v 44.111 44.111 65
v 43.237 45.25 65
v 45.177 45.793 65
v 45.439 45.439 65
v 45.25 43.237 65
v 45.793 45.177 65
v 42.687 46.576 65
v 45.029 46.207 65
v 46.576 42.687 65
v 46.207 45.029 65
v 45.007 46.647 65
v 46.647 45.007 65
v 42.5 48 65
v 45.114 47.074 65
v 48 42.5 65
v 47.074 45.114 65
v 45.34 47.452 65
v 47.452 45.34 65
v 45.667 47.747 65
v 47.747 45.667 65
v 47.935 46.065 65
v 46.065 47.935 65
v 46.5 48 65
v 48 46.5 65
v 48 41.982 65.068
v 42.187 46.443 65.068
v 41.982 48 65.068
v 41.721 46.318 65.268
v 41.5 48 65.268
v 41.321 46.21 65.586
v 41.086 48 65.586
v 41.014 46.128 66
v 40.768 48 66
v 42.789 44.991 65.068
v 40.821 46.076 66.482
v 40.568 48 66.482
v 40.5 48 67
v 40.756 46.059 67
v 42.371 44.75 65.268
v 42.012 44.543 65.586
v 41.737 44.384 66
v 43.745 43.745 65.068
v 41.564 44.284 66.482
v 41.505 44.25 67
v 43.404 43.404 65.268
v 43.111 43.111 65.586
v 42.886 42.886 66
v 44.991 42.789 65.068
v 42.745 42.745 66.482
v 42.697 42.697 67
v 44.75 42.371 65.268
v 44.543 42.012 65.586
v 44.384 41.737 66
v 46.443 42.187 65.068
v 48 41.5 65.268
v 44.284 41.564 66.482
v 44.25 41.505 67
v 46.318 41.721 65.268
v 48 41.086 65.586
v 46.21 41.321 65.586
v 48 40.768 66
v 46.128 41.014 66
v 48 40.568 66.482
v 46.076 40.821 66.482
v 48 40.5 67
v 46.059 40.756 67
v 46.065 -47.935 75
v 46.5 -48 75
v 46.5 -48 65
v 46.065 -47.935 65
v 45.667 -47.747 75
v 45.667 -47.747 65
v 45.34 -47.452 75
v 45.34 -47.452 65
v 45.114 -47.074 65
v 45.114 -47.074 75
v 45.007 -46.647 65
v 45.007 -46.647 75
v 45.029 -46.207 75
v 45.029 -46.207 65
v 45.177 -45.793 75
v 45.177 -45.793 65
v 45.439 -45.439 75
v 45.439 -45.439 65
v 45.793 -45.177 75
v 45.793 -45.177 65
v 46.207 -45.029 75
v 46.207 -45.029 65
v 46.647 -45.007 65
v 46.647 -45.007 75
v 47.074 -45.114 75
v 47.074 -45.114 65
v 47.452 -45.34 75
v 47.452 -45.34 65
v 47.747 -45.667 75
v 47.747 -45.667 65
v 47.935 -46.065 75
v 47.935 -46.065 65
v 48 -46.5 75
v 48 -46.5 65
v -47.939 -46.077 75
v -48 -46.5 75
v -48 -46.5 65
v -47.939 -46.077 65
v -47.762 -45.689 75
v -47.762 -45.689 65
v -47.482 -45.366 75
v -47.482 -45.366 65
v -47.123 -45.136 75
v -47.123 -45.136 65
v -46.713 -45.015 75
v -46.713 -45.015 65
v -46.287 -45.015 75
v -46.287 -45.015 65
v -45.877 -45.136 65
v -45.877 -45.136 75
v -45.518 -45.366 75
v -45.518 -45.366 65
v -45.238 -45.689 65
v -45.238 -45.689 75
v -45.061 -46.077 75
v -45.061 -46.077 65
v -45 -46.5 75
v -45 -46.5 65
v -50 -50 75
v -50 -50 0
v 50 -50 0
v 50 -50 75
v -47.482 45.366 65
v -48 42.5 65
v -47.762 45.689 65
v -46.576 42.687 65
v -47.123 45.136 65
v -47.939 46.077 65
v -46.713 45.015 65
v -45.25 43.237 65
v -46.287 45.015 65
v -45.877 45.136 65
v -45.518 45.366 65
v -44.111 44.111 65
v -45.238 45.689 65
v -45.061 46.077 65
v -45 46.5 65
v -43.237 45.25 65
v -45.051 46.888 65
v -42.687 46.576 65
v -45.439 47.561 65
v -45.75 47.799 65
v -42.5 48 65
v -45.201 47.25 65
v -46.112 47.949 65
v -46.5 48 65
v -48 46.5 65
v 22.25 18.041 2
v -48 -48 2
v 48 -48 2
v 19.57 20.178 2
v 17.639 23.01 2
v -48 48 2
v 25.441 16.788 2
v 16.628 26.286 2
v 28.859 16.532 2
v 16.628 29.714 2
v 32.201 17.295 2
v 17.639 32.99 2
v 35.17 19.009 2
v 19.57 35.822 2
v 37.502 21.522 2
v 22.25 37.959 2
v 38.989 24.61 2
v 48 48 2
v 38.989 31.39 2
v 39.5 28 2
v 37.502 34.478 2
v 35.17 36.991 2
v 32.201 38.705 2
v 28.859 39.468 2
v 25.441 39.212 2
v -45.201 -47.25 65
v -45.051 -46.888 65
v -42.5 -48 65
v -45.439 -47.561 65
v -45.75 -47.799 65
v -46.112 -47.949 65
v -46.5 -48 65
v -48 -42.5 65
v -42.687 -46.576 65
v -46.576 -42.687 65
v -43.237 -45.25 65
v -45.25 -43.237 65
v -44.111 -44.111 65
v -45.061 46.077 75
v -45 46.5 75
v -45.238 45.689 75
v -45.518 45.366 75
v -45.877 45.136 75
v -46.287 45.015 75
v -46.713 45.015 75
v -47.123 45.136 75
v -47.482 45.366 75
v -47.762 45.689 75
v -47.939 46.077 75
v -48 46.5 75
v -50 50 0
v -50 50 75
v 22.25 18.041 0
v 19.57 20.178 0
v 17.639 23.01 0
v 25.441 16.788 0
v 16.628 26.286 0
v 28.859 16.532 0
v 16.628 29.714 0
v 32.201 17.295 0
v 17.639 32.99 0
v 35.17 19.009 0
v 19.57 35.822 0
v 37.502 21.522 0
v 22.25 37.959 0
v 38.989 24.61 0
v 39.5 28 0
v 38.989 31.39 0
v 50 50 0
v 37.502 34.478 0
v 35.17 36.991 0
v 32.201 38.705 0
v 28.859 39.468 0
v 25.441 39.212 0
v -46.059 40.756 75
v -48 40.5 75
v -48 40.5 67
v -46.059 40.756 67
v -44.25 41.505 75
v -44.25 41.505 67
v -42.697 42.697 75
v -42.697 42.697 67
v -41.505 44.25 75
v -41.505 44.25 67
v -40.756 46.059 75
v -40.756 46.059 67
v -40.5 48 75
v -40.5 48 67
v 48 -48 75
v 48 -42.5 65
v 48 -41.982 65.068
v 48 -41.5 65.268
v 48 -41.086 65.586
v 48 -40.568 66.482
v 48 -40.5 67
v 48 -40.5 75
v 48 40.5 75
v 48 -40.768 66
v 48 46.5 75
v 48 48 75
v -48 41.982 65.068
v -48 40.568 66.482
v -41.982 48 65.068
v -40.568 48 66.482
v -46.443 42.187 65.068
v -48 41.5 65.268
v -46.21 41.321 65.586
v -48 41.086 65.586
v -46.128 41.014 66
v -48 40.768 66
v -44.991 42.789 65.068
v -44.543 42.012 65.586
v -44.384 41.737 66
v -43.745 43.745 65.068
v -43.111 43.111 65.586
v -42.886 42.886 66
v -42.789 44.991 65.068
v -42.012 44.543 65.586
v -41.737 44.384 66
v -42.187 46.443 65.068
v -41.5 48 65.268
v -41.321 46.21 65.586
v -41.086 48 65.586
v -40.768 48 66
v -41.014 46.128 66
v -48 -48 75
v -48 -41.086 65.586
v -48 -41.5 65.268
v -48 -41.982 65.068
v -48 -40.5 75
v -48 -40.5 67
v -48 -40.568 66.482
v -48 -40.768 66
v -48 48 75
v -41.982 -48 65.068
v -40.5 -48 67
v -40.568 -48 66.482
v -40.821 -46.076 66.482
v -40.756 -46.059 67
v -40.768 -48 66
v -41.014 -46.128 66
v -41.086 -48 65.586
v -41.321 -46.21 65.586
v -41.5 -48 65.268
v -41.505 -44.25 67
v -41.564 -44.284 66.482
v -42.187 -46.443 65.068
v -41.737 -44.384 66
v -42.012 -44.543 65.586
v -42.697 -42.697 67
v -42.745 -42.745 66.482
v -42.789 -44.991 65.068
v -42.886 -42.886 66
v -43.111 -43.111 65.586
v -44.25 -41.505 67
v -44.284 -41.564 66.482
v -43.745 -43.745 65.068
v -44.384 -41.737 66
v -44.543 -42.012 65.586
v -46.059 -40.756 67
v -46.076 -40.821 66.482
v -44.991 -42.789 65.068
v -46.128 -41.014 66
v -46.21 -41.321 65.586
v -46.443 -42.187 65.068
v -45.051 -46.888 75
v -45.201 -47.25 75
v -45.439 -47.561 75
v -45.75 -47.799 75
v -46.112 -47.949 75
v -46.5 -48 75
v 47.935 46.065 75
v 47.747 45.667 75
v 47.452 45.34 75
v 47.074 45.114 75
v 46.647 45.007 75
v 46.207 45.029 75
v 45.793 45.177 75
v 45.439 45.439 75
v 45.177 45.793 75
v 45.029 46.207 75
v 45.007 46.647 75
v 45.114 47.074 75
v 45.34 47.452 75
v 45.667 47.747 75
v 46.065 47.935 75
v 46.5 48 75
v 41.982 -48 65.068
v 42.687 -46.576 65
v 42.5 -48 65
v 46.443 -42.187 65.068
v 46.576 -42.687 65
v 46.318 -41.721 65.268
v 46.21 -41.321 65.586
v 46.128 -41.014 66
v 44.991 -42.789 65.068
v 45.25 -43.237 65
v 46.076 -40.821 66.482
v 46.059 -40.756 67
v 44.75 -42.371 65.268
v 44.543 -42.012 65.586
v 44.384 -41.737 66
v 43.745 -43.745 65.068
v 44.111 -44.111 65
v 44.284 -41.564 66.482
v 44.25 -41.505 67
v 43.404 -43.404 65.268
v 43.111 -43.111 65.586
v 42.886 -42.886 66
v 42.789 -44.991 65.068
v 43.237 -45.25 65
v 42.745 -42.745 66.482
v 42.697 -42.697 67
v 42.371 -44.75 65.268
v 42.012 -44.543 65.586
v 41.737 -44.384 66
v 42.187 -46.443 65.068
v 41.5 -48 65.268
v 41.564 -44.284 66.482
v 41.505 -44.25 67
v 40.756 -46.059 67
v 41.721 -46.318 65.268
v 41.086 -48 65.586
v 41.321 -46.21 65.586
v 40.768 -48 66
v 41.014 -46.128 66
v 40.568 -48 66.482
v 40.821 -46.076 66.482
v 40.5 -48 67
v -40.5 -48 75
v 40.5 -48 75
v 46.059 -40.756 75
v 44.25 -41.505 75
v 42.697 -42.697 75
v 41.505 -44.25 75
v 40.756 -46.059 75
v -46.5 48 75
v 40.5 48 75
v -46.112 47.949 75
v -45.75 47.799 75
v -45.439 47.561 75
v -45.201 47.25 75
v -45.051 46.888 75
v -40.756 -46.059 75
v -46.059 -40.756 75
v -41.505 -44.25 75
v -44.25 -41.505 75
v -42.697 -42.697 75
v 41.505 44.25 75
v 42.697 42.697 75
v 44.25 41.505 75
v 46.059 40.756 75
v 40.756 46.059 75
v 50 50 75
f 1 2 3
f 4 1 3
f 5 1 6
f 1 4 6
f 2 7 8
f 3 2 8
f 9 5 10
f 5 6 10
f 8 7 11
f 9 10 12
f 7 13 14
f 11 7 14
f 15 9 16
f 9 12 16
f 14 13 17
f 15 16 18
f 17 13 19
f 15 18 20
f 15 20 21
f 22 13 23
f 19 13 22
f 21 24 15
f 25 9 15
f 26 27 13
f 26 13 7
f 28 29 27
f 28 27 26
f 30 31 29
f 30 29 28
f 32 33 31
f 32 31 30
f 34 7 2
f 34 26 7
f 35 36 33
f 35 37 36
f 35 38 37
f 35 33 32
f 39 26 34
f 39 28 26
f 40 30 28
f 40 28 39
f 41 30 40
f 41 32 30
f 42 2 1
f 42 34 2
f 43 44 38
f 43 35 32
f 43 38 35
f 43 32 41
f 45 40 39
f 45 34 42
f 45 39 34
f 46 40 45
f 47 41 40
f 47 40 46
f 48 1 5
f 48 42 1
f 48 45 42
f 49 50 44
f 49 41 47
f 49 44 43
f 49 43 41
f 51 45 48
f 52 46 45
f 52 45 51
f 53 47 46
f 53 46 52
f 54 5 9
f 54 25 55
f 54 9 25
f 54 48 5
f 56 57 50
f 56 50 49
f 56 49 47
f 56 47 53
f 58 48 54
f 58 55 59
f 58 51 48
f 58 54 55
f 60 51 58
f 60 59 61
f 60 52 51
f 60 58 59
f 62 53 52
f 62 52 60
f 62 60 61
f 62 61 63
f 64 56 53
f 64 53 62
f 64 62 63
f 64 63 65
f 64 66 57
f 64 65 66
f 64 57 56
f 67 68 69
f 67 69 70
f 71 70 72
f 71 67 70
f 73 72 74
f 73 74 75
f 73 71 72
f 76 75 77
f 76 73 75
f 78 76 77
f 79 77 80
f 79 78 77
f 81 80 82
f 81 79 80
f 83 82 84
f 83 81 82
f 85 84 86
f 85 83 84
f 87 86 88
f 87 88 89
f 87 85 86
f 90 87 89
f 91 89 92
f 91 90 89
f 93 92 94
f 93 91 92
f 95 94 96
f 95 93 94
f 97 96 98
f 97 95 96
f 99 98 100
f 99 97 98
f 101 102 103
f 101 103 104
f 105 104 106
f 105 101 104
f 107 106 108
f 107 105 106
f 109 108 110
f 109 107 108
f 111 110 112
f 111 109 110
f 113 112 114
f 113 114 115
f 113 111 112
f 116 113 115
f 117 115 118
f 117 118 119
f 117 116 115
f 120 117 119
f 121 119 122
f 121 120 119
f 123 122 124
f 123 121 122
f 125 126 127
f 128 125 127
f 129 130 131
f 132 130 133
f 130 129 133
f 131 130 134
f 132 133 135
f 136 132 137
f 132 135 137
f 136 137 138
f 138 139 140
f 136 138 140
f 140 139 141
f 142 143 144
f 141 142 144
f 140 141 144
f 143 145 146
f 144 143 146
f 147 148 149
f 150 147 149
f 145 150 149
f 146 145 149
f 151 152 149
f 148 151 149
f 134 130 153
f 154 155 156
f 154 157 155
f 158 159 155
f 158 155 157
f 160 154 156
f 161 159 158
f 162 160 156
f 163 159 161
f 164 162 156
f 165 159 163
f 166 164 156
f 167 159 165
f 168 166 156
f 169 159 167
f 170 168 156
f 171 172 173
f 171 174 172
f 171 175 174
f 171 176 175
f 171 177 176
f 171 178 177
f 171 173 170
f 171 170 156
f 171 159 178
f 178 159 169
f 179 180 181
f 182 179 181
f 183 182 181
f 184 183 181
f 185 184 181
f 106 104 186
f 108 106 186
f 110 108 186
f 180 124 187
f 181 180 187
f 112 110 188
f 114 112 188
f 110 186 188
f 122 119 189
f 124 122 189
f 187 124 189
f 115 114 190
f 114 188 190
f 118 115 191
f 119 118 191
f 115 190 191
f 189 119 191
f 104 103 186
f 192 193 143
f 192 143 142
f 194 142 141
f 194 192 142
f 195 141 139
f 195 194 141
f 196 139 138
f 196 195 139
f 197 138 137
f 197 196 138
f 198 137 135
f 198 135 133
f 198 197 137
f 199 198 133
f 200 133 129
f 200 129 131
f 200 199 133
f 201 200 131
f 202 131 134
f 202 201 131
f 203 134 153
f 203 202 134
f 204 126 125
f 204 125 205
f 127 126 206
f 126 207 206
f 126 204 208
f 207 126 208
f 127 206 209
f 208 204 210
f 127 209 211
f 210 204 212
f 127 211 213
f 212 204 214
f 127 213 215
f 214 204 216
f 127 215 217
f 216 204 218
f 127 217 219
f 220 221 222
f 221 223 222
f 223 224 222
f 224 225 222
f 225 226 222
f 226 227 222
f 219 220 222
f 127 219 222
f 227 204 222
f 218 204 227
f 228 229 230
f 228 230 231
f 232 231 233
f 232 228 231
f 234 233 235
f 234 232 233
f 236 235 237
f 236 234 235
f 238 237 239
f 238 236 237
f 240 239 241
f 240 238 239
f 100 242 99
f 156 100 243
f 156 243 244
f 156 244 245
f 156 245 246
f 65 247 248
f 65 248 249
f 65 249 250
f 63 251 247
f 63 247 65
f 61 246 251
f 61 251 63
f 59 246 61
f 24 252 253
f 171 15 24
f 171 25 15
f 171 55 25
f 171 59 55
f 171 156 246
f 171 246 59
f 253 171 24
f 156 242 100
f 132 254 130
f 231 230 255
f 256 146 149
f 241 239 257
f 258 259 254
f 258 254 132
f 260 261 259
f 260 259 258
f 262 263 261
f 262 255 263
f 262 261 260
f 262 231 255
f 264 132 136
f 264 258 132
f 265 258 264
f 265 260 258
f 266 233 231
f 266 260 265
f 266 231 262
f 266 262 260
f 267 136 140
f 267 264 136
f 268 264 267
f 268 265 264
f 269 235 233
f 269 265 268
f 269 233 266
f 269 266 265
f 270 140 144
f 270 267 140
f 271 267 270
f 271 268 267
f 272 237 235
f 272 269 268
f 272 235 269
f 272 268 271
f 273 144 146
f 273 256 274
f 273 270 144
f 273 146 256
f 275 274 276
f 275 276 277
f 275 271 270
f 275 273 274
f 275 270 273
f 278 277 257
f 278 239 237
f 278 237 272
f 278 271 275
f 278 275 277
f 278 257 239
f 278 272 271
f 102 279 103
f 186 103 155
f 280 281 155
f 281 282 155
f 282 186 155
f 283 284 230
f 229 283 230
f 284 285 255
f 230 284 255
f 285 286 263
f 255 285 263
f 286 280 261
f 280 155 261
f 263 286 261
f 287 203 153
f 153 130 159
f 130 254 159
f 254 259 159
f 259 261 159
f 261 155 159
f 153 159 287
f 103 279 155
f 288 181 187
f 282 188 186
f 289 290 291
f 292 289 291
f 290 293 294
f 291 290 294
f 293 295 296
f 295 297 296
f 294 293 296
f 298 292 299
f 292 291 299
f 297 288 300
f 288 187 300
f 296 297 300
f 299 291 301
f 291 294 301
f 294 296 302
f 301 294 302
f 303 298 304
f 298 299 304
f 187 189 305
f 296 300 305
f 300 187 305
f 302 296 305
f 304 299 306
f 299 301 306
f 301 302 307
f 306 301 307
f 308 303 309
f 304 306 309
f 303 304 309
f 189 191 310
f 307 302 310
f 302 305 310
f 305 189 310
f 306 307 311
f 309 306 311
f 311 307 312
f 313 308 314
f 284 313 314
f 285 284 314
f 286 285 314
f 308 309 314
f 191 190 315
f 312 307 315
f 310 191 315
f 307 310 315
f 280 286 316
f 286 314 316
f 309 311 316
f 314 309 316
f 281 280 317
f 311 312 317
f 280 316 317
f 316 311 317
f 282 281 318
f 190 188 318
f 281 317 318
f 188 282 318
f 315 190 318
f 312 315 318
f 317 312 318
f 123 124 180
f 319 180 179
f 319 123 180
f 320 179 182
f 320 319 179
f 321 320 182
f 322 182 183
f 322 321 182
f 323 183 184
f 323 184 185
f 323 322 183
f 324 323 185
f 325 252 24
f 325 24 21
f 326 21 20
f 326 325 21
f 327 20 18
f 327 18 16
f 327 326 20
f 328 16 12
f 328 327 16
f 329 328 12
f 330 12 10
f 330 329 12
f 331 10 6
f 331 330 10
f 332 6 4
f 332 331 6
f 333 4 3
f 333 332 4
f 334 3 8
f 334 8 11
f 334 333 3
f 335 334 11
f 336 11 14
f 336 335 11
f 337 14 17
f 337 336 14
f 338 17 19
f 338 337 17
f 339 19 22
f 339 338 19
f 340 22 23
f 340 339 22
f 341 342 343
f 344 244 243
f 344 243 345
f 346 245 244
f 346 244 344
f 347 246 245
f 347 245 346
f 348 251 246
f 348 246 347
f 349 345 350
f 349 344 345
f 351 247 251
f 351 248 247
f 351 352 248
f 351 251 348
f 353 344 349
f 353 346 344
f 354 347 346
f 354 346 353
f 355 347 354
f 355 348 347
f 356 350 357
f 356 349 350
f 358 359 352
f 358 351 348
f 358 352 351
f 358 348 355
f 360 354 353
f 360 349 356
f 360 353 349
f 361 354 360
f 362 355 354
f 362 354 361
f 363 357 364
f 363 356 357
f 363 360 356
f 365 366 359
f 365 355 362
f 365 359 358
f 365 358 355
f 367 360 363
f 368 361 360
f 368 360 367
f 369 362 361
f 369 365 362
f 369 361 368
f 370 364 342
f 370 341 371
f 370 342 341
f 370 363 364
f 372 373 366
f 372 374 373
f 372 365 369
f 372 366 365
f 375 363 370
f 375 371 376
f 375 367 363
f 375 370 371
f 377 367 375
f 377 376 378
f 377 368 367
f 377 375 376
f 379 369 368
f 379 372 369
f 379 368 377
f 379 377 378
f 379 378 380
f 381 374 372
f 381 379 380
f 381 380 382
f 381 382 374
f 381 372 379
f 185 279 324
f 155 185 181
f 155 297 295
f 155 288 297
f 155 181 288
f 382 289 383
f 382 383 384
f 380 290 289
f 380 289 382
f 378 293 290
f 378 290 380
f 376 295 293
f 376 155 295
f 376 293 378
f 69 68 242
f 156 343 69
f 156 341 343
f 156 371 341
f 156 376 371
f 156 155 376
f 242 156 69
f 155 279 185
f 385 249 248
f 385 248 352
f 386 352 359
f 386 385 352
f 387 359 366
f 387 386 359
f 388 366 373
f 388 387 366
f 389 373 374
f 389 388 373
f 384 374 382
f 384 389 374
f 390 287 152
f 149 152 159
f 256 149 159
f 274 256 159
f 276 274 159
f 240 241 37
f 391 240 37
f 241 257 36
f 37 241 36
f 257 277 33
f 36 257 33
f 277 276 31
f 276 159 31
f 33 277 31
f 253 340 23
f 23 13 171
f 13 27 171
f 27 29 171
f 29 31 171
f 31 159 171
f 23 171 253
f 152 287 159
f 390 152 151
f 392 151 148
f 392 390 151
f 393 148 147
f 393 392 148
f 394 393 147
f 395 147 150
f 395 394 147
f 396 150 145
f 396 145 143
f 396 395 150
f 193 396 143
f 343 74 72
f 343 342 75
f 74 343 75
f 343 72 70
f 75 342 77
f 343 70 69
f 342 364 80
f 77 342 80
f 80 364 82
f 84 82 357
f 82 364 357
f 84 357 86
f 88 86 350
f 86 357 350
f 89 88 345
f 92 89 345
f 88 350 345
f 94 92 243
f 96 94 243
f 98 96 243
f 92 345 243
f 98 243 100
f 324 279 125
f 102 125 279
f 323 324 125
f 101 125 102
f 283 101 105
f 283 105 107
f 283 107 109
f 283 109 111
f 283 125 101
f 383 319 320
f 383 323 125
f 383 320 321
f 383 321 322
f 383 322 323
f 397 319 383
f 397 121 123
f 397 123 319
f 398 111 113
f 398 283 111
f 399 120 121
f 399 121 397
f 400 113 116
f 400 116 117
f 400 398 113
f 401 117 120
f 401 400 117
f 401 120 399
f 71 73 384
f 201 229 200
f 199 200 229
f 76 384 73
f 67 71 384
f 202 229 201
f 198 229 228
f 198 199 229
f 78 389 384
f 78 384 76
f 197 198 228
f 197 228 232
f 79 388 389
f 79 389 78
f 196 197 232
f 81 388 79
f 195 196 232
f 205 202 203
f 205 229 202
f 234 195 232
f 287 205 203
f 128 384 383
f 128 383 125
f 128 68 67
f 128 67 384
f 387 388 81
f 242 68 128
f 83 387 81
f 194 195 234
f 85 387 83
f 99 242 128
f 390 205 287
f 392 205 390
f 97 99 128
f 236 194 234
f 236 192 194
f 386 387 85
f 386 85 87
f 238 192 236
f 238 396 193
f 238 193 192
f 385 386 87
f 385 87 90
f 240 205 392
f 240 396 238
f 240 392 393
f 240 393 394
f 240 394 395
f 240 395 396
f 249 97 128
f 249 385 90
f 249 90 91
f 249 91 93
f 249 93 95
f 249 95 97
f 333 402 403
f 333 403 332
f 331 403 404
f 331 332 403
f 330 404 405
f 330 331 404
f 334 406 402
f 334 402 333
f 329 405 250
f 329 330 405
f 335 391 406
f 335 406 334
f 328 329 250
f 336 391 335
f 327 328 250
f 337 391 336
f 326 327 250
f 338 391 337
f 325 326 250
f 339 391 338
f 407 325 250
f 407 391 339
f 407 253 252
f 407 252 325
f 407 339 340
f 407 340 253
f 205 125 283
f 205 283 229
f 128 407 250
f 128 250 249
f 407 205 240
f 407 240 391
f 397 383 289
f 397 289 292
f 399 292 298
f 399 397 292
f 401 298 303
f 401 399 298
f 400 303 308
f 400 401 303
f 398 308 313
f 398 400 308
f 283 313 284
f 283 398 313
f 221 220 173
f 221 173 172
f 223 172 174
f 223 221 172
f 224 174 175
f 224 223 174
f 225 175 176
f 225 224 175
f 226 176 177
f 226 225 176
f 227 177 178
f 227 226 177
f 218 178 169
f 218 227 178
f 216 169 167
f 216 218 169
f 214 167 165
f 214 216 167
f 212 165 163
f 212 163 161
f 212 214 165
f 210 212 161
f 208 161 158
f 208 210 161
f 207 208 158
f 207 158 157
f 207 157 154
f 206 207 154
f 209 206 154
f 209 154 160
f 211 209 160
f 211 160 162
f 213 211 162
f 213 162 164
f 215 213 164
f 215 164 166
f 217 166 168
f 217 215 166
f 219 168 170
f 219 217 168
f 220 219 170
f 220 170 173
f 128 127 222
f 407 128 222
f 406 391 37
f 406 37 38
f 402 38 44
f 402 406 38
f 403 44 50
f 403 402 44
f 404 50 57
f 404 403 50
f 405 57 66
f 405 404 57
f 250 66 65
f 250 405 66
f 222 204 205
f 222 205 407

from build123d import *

# Parameters (mm, degrees)
F0_W     = 100
F0_H     = 100
F0_W_2   = 96
F0_H_2   = 96
F1_DEPTH = 75
F0_R     = 11.5
F2_DEPTH = 2
F4_DEPTH = 10
F5_R     = 2
F6_DEPTH = 10


with BuildPart() as f1:
    # F0 (on Top) → F1 (new body)
    with BuildSketch(Plane.XY):
        Rectangle(F0_W, F0_H)
        Rectangle(F0_W_2, F0_H_2, mode=Mode.SUBTRACT)
    extrude(amount=F1_DEPTH)

    # F0 (on Top) → F2 (join)
    with BuildSketch(Plane.XY):
        Rectangle(F0_W_2, F0_H_2)
        with Locations((28, 28)):
            Circle(F0_R, mode=Mode.SUBTRACT)
    extrude(amount=F2_DEPTH)

    # F3 (on face) → F4 (join)
    with BuildSketch(Plane.XY.offset(75)):
        with BuildLine():
            Line((46.5, 48), (40.5, 48))
            ThreePointArc((40.5, 48), (42.696699, 42.696699), (48, 40.5))
            Line((48, 40.5), (48, 46.5))
            ThreePointArc((48, 46.5), (45.43934, 45.43934), (46.5, 48))
        make_face()
        with BuildLine():
            Line((48, -46.5), (48, -40.5))
            ThreePointArc((48, -40.5), (42.696699, -42.696699), (40.5, -48))
            Line((40.5, -48), (46.5, -48))
            ThreePointArc((46.5, -48), (45.43934, -45.43934), (48, -46.5))
        make_face()
        with BuildLine():
            ThreePointArc((-40.5, -48), (-42.696699, -42.696699), (-48, -40.5))
            Line((-48, -40.5), (-48, -46.5))
            ThreePointArc((-48, -46.5), (-46.5, -45), (-45, -46.5))
            ThreePointArc((-45, -46.5), (-45.43934, -47.56066), (-46.5, -48))
            Line((-46.5, -48), (-40.5, -48))
        make_face()
        with BuildLine():
            ThreePointArc((-48, 40.5), (-42.696699, 42.696699), (-40.5, 48))
            Line((-40.5, 48), (-46.5, 48))
            ThreePointArc((-46.5, 48), (-45.43934, 47.56066), (-45, 46.5))
            ThreePointArc((-45, 46.5), (-46.5, 45), (-48, 46.5))
            Line((-48, 46.5), (-48, 40.5))
        make_face()
    extrude(amount=-F4_DEPTH)

    # F5
    f5_edges = [f1.edges().sort_by_distance(p)[0] for p in [
        (-42.696699, -42.696699, 65),
        (-42.696699, 42.696699, 65),
        (42.696699, 42.696699, 65),
        (42.696699, -42.696699, 65),
    ]]
    fillet(f5_edges, radius=F5_R)

    # F3 (on face) → F6 (cut)
    with BuildSketch(Plane.XY.offset(75)):
        with BuildLine():
            ThreePointArc((-45, 46.5), (-45.43934, 47.56066), (-46.5, 48))
            ThreePointArc((-46.5, 48), (-47.56066, 47.56066), (-48, 46.5))
            ThreePointArc((-48, 46.5), (-46.5, 45), (-45, 46.5))
        make_face()
        with BuildLine():
            ThreePointArc((48, 46.5), (47.56066, 47.56066), (46.5, 48))
            ThreePointArc((46.5, 48), (45.43934, 45.43934), (48, 46.5))
        make_face()
        with BuildLine():
            ThreePointArc((46.5, -48), (47.56066, -47.56066), (48, -46.5))
            ThreePointArc((48, -46.5), (45.43934, -45.43934), (46.5, -48))
        make_face()
        with BuildLine():
            ThreePointArc((-45, -46.5), (-46.5, -45), (-48, -46.5))
            ThreePointArc((-48, -46.5), (-47.56066, -47.56066), (-46.5, -48))
            ThreePointArc((-46.5, -48), (-45.43934, -47.56066), (-45, -46.5))
        make_face()
    extrude(amount=-F6_DEPTH, mode=Mode.SUBTRACT)


solid = f1.part
